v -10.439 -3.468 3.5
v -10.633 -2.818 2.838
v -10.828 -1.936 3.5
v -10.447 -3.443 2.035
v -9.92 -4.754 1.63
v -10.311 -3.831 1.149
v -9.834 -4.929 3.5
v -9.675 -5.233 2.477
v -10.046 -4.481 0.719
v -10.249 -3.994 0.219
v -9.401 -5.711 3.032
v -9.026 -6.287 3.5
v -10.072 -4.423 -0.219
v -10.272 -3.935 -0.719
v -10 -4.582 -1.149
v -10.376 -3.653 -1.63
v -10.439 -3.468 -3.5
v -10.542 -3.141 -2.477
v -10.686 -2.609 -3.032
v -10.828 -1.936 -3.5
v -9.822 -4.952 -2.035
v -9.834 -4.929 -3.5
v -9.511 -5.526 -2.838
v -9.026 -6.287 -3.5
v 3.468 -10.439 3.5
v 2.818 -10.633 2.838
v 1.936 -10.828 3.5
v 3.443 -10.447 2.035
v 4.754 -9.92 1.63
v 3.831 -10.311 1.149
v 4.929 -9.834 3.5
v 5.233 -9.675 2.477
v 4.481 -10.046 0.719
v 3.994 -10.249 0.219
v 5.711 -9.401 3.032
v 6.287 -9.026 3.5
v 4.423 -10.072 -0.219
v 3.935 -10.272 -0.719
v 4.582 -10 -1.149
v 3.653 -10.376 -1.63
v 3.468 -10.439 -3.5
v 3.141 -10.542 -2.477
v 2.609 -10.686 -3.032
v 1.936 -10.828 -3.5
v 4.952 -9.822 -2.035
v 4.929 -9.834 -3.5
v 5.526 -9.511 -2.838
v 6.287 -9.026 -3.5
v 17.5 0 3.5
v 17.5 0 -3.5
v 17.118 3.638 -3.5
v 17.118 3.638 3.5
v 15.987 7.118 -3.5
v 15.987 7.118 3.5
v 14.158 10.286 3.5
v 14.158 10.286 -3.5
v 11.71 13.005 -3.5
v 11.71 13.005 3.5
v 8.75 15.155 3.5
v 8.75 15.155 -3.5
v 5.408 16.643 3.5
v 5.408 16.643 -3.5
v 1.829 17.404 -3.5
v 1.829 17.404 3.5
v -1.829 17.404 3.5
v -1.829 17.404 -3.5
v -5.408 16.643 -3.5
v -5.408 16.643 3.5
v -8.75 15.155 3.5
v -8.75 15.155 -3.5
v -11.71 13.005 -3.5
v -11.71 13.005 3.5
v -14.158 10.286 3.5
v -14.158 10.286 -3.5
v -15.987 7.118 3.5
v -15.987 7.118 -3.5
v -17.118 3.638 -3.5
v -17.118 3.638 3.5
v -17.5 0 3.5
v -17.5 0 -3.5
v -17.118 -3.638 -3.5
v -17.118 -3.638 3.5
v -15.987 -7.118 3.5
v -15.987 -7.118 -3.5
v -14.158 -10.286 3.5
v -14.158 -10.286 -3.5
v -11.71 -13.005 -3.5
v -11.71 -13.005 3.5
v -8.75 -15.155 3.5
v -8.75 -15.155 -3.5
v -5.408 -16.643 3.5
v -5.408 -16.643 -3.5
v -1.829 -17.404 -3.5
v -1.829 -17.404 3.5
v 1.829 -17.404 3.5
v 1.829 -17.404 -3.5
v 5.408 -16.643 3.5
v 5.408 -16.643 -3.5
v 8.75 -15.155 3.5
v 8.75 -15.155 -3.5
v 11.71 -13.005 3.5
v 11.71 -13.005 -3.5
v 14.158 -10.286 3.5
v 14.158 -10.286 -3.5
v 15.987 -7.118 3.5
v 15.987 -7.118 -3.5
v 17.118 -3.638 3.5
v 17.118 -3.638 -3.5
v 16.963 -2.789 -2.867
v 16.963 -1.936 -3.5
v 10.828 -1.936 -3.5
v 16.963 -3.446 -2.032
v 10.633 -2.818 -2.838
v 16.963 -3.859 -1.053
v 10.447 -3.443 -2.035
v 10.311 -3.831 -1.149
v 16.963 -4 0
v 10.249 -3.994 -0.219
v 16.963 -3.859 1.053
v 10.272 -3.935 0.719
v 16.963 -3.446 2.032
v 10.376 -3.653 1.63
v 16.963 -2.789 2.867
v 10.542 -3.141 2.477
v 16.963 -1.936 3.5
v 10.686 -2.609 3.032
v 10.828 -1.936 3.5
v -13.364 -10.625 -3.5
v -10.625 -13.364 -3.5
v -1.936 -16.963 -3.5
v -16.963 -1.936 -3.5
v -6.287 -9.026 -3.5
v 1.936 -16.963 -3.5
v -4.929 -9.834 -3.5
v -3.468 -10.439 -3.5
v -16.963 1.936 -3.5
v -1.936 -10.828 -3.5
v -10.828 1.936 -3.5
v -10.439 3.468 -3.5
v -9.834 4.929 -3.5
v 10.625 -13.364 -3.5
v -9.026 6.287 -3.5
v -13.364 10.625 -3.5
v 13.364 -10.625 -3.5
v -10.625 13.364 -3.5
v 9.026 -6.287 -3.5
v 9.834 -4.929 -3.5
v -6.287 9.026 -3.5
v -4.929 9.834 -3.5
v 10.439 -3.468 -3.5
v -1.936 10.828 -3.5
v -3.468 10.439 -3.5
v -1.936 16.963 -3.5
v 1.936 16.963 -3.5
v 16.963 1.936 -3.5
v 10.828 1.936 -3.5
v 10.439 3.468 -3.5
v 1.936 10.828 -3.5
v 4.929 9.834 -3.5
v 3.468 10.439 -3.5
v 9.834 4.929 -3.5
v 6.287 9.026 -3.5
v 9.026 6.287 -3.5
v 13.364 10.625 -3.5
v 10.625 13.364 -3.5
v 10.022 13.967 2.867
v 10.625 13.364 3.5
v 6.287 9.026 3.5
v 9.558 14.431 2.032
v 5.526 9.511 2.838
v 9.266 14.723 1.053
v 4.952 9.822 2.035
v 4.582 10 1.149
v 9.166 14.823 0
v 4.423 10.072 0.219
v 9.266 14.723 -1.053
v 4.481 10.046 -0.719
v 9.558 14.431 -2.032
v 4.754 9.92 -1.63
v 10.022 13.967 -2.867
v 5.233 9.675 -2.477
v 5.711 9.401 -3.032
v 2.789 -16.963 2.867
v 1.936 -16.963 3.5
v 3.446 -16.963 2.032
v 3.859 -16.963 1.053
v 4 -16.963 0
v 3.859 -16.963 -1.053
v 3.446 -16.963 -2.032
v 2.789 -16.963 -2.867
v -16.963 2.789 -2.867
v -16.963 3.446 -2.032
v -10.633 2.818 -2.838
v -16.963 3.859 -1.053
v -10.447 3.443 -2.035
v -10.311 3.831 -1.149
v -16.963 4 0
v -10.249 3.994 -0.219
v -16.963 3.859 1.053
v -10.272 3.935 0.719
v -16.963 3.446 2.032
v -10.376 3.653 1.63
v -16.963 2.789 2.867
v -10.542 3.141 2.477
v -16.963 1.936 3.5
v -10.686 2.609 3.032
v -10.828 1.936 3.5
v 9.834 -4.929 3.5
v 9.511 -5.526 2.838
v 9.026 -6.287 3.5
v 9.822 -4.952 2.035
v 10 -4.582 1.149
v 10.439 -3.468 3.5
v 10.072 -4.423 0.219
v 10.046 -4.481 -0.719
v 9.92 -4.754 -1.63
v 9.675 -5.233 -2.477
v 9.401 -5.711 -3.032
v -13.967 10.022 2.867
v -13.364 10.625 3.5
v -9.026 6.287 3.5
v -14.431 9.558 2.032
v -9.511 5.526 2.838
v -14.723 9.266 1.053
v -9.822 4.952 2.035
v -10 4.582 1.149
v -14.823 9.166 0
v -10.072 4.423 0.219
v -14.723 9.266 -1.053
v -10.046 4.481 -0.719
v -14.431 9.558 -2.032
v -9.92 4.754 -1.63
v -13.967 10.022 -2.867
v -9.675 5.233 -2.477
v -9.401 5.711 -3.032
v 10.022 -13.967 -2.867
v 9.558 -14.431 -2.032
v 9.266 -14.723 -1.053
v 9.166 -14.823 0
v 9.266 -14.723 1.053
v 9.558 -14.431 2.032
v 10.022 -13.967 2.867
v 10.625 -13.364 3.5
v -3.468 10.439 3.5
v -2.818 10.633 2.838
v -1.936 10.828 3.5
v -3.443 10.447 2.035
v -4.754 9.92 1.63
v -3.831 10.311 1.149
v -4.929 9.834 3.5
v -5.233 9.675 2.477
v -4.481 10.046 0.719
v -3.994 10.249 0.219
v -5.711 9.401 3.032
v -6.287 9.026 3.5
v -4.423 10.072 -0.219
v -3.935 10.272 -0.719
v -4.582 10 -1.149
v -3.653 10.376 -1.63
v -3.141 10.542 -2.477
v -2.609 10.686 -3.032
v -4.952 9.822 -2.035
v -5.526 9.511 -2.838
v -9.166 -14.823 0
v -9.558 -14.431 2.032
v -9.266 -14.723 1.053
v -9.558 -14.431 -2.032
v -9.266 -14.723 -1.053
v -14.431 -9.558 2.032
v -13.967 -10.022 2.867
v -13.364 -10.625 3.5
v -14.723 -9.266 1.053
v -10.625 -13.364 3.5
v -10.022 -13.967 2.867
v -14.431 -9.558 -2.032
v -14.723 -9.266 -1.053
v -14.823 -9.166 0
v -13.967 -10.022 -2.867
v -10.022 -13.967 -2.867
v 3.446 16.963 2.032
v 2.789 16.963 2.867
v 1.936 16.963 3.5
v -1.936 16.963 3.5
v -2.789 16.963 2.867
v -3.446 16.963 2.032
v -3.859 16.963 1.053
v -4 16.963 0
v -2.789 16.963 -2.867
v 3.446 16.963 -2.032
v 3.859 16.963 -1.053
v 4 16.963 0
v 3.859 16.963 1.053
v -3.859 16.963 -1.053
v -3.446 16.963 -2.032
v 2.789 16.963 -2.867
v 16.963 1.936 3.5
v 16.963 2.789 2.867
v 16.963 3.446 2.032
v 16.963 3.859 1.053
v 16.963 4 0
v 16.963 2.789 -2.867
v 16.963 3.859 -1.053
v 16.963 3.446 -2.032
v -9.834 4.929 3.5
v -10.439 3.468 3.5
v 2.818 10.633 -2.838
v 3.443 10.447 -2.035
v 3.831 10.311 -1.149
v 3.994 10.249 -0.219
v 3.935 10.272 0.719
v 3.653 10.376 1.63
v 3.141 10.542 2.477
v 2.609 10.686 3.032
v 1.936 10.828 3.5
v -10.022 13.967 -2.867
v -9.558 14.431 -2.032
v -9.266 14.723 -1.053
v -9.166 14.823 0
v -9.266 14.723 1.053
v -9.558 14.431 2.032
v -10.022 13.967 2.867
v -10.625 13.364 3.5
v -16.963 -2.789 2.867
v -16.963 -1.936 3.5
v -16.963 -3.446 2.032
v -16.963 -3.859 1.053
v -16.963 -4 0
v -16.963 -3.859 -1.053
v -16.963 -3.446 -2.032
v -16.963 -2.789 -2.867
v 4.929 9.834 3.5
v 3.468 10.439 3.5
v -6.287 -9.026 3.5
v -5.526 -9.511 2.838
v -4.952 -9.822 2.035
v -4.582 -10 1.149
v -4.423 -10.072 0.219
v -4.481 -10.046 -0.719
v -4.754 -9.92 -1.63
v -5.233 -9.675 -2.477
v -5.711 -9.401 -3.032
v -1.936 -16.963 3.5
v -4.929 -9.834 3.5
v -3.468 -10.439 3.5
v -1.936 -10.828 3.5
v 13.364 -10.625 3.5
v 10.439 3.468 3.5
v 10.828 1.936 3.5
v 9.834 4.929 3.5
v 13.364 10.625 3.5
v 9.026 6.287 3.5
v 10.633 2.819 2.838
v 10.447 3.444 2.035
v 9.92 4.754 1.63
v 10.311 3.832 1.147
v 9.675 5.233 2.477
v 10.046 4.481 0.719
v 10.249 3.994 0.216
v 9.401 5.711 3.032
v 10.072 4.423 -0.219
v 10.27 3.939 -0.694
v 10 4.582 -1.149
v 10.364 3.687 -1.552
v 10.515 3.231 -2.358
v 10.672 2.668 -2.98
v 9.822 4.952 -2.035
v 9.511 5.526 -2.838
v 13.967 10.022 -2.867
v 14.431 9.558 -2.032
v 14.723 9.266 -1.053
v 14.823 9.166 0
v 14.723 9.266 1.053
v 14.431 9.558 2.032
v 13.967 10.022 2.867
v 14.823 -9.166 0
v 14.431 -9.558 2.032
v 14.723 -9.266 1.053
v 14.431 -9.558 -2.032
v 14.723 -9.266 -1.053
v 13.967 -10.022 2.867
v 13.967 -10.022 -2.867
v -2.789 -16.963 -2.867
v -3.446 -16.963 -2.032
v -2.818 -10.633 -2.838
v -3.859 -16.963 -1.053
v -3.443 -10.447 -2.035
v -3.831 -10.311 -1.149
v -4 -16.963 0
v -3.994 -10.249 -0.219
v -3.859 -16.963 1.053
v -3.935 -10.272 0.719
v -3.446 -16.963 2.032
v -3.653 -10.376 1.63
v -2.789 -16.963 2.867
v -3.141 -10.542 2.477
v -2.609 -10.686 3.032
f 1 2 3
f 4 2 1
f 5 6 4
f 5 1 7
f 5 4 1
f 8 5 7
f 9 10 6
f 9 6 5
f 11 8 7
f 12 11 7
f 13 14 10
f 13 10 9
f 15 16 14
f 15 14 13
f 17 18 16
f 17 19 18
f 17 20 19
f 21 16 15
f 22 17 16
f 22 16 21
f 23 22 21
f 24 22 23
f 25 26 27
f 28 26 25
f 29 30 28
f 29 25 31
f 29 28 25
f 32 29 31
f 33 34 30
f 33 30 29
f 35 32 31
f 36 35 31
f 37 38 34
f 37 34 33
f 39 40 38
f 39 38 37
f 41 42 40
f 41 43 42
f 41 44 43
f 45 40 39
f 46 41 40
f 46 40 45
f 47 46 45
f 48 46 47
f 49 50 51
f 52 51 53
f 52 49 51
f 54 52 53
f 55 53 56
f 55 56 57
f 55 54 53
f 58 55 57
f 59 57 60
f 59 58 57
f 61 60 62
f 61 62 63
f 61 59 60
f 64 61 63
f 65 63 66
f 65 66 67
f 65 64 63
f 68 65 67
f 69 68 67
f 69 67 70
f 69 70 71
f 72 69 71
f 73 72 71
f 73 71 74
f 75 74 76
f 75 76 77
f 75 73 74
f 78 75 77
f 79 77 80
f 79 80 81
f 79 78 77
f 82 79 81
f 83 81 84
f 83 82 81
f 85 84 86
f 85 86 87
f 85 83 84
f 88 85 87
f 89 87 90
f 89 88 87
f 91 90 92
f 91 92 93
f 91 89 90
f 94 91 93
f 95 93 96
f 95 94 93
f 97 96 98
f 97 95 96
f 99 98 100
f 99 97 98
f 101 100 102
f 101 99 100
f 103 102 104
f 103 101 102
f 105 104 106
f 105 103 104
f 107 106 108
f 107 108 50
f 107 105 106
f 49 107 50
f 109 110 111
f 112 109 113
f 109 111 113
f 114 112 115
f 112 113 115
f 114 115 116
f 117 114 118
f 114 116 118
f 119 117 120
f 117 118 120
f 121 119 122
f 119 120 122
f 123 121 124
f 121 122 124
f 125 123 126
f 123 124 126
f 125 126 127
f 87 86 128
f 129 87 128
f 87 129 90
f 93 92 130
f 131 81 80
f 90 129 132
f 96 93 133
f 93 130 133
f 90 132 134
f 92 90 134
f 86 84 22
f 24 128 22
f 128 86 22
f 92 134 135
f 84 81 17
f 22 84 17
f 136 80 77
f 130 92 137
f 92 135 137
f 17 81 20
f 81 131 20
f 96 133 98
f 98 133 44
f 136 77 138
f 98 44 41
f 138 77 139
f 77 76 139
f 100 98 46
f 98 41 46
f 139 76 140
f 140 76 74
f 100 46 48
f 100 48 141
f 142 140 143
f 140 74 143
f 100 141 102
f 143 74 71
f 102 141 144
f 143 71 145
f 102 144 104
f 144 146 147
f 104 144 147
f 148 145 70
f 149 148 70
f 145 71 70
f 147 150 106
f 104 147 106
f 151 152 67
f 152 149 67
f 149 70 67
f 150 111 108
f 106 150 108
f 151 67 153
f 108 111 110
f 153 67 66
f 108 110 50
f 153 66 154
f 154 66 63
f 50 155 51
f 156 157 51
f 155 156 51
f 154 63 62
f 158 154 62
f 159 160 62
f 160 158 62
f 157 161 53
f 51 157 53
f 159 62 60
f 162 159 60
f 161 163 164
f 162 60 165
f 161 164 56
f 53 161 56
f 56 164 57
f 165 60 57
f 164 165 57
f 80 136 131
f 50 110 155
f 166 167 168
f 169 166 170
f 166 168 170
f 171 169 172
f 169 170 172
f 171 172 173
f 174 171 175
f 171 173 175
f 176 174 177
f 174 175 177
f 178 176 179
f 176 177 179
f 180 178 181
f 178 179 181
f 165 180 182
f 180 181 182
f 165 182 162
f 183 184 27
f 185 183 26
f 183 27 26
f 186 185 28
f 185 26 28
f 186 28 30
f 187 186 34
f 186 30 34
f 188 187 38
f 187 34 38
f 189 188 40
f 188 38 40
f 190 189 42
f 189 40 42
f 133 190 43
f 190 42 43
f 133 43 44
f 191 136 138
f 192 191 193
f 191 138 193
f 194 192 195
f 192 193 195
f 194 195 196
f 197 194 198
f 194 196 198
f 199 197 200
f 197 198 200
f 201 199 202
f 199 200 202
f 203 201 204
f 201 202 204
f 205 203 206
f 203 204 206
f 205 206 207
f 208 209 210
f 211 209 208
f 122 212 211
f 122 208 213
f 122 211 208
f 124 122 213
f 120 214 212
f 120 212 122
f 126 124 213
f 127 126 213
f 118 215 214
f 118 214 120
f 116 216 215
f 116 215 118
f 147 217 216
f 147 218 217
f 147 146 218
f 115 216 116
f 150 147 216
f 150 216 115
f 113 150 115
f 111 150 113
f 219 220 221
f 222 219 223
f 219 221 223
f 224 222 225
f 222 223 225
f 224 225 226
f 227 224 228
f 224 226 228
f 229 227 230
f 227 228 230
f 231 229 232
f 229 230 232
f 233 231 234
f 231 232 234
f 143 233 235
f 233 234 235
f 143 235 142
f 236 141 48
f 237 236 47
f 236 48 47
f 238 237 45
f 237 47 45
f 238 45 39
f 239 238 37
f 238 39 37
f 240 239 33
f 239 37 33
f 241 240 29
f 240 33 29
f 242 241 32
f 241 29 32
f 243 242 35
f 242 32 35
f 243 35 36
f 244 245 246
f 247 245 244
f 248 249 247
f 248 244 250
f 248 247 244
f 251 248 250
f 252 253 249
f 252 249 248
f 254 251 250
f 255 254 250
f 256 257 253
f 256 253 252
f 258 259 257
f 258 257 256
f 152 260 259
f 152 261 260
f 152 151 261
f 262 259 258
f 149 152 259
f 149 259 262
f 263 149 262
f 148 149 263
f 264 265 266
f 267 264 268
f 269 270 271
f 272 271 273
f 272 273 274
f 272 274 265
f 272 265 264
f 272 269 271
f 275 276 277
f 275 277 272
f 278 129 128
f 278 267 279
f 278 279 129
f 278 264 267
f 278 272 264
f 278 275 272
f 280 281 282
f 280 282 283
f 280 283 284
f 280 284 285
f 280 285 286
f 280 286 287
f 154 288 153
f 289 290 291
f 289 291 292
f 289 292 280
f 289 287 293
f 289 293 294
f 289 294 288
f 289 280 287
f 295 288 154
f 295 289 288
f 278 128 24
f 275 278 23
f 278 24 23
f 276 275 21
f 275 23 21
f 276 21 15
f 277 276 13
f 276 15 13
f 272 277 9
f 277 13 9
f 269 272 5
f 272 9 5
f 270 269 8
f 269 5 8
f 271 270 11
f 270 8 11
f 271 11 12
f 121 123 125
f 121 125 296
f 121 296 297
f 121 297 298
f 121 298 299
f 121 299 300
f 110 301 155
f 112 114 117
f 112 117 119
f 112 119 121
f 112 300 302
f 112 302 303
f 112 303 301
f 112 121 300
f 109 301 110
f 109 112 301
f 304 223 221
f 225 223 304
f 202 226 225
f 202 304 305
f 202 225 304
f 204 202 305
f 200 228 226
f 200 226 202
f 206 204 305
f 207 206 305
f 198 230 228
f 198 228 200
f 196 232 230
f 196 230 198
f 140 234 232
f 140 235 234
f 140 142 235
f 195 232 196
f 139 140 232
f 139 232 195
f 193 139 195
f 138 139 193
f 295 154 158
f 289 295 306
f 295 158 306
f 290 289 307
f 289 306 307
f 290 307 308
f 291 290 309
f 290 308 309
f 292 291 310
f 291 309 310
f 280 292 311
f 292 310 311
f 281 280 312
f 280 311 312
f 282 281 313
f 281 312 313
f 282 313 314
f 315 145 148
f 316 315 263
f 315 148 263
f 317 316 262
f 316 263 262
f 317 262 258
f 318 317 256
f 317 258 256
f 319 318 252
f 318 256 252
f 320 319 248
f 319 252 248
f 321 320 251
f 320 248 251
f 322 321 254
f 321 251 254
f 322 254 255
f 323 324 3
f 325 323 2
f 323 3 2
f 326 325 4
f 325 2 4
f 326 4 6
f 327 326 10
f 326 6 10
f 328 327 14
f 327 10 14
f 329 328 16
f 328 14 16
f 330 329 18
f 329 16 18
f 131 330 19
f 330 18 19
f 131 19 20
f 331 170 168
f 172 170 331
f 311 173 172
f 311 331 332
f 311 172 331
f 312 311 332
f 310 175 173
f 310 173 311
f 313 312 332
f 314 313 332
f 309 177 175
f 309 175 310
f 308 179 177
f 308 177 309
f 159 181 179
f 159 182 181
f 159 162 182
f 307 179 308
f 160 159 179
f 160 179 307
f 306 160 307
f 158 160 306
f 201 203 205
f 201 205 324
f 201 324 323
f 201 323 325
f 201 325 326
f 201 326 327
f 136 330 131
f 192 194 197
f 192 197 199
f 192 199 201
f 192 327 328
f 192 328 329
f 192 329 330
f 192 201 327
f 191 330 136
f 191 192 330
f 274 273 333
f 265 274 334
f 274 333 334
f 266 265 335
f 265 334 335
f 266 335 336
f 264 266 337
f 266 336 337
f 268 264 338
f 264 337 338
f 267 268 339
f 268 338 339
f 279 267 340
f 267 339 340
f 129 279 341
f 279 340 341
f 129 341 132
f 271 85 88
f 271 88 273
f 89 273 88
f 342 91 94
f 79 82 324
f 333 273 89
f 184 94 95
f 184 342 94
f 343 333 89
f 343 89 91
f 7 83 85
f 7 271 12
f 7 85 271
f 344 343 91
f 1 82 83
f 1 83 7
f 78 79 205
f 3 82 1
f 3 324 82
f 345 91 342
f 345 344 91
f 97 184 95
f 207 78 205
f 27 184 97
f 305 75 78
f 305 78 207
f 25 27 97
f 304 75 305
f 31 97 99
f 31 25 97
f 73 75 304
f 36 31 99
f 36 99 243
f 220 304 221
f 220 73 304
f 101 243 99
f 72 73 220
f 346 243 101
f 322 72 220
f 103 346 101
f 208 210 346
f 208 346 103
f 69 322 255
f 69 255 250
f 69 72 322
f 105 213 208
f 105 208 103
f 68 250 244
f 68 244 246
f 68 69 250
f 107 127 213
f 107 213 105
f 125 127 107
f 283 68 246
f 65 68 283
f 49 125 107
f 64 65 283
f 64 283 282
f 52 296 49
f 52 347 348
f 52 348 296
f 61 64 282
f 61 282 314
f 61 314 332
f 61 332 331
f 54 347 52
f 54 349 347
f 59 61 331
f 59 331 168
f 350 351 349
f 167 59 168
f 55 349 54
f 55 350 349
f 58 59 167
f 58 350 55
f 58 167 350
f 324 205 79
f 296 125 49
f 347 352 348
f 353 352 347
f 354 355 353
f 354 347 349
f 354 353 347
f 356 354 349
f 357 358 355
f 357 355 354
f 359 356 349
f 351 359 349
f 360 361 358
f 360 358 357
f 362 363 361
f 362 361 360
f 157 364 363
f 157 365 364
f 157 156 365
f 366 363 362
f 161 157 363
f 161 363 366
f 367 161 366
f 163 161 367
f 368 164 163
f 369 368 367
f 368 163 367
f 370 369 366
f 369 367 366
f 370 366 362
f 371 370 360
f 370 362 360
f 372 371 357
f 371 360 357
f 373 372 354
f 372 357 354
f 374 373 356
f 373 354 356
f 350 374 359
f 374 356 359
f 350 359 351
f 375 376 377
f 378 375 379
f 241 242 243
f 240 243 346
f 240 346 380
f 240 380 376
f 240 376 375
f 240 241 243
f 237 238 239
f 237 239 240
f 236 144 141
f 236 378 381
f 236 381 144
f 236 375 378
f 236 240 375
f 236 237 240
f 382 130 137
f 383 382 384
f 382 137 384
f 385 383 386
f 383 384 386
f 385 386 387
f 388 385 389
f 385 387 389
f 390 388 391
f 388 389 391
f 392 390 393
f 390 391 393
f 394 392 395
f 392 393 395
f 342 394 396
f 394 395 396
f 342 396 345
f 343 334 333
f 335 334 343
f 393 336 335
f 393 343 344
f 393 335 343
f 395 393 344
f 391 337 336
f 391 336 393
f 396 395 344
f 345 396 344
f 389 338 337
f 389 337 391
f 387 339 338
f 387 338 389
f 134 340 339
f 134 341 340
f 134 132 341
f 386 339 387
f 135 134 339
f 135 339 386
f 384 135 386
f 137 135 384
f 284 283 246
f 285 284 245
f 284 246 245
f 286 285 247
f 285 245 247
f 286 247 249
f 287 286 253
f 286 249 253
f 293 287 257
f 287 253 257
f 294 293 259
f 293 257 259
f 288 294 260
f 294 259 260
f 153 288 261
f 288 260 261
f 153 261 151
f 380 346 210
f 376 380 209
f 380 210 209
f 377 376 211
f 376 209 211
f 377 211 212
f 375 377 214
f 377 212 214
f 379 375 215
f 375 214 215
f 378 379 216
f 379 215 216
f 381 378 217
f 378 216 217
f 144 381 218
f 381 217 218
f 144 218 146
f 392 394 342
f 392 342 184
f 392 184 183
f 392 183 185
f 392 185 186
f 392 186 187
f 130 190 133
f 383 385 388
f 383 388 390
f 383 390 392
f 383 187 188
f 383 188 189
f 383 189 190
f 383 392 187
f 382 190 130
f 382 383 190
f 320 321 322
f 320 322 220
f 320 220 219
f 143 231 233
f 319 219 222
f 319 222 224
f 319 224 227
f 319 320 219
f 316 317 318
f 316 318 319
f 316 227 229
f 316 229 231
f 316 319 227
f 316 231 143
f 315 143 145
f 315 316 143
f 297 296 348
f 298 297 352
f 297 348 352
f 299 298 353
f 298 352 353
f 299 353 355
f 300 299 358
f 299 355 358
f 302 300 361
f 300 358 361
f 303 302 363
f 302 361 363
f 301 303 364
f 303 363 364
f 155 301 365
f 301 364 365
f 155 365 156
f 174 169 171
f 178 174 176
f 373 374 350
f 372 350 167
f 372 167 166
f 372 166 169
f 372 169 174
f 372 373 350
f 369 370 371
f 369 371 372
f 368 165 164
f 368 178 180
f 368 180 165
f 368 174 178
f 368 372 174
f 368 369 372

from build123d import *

# Parameters (mm, degrees)
SKETCH1_R           = 17.5
SKETCH1_R_2         = 11
BOSS_EXTRUDE1_DEPTH = 3.5
SKETCH4_R           = 4
CUT_EXTRUDE1_DEPTH  = 6.8
CIRPATTERN1_COUNT   = 8


with BuildPart() as part:
    # Sketch1 → Boss-Extrude1 (new, symmetric)
    with BuildSketch(Plane.XY):
        Circle(SKETCH1_R)
        Circle(SKETCH1_R_2, mode=Mode.SUBTRACT)
    extrude(amount=BOSS_EXTRUDE1_DEPTH, both=True)

    # Sketch4 → Cut-Extrude1 (cut)
    with BuildSketch(Plane(origin=(-10.162674858, 0, 0), x_dir=(0, 0, -1), z_dir=(1, 0, 0))):
        Circle(SKETCH4_R)
    cut_extrude1 = extrude(amount=-CUT_EXTRUDE1_DEPTH, mode=Mode.SUBTRACT)

    # CirPattern1: Cut-Extrude1 ×8 about axis
    cirpattern1_axis = Axis((0, 0, 3.5), (0, 0, -1))
    for i in range(1, CIRPATTERN1_COUNT):
        add(cut_extrude1.rotate(cirpattern1_axis, i * 360 / CIRPATTERN1_COUNT), mode=Mode.SUBTRACT)


solid = part.part
